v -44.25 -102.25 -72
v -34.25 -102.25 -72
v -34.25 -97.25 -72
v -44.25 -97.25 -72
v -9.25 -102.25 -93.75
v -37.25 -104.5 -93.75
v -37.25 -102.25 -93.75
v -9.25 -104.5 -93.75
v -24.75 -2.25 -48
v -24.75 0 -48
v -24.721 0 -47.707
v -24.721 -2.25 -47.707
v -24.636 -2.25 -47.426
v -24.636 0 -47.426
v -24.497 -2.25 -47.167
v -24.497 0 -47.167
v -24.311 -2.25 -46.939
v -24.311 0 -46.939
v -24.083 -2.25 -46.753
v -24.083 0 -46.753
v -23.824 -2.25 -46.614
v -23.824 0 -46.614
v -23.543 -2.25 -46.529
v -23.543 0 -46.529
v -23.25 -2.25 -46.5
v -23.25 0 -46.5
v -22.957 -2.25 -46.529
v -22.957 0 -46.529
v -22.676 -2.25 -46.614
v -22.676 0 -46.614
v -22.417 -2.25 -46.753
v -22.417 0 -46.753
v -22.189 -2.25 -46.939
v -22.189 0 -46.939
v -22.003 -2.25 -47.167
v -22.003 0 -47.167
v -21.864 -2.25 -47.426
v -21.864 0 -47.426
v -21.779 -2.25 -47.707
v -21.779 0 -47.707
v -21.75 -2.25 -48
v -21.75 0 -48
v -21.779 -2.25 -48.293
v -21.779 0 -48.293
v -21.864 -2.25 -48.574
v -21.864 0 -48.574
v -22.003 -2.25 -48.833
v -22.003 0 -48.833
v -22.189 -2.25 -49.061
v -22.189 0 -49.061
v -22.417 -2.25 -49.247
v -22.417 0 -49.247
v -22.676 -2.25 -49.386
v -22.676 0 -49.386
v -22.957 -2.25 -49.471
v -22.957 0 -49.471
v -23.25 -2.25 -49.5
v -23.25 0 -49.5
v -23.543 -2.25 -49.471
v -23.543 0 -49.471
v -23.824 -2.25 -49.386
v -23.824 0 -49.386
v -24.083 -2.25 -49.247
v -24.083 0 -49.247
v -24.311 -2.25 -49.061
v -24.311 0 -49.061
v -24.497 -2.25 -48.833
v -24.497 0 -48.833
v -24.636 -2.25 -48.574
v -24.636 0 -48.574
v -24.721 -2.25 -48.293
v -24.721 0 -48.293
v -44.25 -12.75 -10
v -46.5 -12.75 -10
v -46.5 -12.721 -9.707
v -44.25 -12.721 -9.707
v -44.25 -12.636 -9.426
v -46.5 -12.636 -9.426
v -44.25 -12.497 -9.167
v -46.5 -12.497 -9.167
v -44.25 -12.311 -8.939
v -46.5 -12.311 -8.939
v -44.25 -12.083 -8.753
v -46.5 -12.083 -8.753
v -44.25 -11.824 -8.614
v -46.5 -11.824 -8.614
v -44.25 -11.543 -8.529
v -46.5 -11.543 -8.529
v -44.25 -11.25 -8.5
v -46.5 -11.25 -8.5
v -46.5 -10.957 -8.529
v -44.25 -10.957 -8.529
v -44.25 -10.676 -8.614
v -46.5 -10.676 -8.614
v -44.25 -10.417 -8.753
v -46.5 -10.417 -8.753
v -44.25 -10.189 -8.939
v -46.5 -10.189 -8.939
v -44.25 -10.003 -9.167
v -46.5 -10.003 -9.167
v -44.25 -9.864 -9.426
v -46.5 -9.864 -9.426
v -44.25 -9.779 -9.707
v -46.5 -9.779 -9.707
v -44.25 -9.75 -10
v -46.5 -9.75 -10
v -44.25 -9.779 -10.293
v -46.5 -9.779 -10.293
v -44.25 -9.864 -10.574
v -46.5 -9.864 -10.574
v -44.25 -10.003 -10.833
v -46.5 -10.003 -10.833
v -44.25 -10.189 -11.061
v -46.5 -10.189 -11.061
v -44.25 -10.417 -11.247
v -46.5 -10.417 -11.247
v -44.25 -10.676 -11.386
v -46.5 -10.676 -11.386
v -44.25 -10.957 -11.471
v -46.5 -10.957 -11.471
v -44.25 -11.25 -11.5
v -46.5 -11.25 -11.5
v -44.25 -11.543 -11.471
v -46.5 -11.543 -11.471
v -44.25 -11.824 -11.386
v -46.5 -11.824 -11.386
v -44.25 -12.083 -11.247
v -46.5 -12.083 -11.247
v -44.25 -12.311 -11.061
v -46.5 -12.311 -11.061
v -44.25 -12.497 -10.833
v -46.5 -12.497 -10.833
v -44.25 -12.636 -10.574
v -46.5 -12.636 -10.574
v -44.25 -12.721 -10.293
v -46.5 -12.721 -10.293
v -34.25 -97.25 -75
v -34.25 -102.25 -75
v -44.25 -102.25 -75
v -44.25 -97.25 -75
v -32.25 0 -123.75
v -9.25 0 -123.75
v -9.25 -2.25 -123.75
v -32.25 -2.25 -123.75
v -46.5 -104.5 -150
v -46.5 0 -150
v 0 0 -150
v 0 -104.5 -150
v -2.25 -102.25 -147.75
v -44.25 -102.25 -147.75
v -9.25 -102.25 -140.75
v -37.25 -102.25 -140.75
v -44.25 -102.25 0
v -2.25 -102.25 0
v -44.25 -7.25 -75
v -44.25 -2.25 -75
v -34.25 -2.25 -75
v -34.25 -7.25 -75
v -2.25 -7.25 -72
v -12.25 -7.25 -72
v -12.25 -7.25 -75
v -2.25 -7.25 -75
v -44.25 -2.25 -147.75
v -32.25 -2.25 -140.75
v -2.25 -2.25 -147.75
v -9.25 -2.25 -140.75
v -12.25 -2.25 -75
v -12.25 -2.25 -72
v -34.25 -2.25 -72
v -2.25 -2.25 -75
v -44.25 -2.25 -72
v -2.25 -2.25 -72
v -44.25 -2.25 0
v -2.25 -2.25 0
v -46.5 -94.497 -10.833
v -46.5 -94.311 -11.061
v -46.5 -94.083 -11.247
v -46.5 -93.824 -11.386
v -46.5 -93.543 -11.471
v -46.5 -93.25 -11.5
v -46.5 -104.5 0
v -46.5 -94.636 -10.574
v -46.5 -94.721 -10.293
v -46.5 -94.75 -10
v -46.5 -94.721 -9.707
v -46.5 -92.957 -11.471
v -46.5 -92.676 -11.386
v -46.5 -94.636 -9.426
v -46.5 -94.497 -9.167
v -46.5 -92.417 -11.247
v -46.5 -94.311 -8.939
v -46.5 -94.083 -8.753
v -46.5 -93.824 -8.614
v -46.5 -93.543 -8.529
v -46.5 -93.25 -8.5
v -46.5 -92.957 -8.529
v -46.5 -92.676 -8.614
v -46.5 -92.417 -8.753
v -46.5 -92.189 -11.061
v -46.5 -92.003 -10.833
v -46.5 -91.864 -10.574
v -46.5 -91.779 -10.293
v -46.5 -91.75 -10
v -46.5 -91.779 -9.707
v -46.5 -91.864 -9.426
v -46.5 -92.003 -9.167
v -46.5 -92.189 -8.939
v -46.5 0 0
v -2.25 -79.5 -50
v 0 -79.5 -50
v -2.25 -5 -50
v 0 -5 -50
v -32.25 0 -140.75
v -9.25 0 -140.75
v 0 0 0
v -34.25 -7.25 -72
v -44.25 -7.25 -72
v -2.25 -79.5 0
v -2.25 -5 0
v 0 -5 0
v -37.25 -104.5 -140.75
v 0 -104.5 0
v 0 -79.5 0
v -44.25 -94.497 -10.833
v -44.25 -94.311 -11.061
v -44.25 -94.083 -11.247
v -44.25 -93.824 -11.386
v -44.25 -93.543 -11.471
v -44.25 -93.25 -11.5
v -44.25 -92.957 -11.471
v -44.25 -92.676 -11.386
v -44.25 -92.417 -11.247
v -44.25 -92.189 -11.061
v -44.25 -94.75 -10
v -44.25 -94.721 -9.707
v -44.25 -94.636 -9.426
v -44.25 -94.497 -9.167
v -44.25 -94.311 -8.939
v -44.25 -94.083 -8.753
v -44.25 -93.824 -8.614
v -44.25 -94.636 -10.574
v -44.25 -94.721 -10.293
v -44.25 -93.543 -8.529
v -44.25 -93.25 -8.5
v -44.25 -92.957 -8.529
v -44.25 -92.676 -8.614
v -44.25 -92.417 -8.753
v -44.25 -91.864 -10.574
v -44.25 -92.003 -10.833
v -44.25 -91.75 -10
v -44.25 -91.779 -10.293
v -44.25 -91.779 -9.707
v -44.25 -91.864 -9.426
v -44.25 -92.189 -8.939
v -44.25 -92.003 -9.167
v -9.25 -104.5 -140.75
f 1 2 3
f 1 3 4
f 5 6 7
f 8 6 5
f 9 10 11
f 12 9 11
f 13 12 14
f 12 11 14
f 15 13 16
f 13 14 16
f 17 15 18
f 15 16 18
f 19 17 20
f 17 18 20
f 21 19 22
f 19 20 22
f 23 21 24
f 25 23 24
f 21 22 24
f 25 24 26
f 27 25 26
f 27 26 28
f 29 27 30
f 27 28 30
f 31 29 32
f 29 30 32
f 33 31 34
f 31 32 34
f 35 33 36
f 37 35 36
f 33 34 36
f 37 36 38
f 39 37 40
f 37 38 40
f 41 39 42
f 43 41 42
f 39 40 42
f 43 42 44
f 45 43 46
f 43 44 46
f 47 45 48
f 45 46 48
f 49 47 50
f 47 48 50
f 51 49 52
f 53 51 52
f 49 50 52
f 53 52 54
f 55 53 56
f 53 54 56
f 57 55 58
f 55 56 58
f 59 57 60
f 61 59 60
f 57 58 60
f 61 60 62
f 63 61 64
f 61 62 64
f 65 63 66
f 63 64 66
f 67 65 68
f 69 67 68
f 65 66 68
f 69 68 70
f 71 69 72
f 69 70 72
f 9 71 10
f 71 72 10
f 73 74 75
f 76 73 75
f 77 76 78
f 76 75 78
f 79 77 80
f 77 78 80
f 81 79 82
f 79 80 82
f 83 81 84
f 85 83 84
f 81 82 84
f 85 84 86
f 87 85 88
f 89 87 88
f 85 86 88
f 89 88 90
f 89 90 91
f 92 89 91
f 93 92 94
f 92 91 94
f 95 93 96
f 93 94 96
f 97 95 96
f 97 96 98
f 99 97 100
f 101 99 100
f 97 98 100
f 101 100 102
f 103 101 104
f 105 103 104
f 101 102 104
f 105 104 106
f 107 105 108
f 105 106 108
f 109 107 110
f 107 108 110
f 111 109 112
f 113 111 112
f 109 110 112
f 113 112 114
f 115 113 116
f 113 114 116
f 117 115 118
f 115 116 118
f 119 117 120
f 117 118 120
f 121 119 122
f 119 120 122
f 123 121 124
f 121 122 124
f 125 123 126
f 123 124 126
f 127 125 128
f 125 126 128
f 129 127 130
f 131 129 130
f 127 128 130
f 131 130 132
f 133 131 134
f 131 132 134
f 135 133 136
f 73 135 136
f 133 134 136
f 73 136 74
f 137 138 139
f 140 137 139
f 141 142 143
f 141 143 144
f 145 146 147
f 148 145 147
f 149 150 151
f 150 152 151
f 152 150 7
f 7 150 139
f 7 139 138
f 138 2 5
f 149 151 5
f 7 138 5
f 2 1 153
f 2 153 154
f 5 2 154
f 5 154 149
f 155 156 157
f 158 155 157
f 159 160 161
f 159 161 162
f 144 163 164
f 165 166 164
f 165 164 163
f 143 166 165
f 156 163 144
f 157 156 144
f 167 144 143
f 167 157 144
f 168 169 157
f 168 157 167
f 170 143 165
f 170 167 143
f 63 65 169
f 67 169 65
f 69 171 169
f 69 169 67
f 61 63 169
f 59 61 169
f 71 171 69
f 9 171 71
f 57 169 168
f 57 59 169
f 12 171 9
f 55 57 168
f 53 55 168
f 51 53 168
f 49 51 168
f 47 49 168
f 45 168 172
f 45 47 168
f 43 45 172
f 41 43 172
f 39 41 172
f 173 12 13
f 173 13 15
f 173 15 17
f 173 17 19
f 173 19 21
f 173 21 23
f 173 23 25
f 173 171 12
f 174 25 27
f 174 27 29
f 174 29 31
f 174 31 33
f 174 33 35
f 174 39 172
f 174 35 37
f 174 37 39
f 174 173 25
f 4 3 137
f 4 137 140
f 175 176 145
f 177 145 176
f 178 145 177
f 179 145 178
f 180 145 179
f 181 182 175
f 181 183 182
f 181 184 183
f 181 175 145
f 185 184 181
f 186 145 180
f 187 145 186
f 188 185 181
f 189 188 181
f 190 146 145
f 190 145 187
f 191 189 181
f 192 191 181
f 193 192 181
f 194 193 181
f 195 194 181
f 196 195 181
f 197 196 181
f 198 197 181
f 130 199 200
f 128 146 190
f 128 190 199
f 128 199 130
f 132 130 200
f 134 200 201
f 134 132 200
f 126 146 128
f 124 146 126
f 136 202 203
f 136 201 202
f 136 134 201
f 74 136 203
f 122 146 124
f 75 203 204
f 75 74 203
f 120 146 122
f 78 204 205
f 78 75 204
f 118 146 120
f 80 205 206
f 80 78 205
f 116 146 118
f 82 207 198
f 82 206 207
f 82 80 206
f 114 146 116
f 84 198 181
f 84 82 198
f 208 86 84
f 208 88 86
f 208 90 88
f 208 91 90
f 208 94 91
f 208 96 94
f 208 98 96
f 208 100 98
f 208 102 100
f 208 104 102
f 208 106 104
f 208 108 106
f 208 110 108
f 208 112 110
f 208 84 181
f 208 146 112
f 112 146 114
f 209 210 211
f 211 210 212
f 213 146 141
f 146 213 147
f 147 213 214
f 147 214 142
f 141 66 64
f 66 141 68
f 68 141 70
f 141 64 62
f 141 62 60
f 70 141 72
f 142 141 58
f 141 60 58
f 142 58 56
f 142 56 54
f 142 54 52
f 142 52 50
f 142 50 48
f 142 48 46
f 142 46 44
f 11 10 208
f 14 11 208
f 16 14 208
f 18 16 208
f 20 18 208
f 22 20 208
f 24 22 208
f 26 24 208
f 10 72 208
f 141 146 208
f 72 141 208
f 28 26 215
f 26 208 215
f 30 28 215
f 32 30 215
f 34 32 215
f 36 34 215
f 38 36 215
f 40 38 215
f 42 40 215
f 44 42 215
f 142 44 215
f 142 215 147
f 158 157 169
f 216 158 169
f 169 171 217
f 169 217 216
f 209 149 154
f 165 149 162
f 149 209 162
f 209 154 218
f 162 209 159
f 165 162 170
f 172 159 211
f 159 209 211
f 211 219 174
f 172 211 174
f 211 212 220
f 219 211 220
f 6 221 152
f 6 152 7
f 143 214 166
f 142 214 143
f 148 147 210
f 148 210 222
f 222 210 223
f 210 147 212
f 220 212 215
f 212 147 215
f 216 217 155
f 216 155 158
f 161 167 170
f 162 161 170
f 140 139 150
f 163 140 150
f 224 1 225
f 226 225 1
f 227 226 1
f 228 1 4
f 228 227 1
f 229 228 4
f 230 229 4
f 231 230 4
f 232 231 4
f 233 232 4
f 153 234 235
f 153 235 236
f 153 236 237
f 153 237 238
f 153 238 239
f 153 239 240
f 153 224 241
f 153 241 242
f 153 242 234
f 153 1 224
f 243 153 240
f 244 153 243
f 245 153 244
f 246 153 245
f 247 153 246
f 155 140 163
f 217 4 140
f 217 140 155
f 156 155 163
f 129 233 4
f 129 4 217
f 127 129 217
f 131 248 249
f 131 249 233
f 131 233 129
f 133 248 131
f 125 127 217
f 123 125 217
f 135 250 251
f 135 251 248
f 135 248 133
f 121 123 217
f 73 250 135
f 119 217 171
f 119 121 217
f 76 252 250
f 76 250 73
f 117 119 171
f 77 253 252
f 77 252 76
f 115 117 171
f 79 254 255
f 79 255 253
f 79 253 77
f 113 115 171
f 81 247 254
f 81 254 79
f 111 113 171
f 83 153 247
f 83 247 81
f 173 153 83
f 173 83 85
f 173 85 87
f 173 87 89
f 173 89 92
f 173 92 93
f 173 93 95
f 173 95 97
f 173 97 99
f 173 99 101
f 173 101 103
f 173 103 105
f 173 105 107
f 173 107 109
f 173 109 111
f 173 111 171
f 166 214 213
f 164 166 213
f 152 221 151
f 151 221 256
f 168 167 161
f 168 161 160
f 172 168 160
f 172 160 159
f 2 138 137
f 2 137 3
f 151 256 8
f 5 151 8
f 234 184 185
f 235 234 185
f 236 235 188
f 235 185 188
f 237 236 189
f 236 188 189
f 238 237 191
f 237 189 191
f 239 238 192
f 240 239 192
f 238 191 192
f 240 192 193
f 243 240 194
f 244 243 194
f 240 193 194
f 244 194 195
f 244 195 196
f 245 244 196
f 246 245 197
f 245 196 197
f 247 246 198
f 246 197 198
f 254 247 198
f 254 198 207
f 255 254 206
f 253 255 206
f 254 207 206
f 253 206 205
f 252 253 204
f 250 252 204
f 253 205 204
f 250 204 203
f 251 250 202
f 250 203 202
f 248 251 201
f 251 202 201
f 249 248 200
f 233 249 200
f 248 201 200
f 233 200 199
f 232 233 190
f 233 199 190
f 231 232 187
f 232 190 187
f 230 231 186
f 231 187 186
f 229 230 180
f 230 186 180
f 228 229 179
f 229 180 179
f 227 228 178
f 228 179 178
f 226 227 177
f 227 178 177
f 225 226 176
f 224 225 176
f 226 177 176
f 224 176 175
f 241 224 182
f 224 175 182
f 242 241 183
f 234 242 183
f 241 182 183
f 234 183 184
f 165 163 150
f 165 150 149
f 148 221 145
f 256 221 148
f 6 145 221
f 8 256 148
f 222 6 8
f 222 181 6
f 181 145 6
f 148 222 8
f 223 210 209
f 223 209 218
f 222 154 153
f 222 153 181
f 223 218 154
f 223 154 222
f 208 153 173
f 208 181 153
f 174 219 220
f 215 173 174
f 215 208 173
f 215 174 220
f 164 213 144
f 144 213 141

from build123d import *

# Parameters (mm, degrees)
F0_W      = 46.5
F0_H      = 150
F1_DEPTH  = 104.5
F2_W      = 42
F2_H      = 100
F3_DEPTH  = 147.75
F4_W      = 74.5
F4_H      = 50
F5_DEPTH  = 2.25
F6_R      = 1.5
F7_DEPTH  = 2.25
F8_R      = 1.5
F9_DEPTH  = 2.25
F10_W     = 10
F10_H     = 3
F11_DEPTH = 5
F12_W     = 10
F12_H     = 3
F13_DEPTH = 5
F14_W     = 28
F14_H     = 47
F15_DEPTH = 2.25
F16_W     = 23
F16_H     = 17
F17_DEPTH = 2.25


with BuildPart() as f1:
    # F0 (on Front) → F1 (new body)
    with BuildSketch(Plane.XZ):
        with Locations((-23.25, -75)):
            Rectangle(F0_W, F0_H)
    extrude(amount=F1_DEPTH)

    # F2 (on face) → F3 (cut, through all)
    with BuildSketch(Plane.XY):
        with Locations((-23.25, -52.25)):
            Rectangle(F2_W, F2_H)
    extrude(amount=-F3_DEPTH, mode=Mode.SUBTRACT)

    # F4 (on face) → F5 (cut)
    with BuildSketch(Plane.YZ):
        with Locations((-42.25, -25)):
            Rectangle(F4_W, F4_H)
    extrude(amount=-F5_DEPTH, mode=Mode.SUBTRACT)

    # F6 (on face) → F7 (cut)
    with BuildSketch(Plane(origin=(-46.5, 0, 0), x_dir=(0, -1, 0), z_dir=(-1, 0, 0))):
        with Locations((11.25, -10)):
            Circle(F6_R)
        with Locations((93.25, -10)):
            Circle(F6_R)
    extrude(amount=-F7_DEPTH, mode=Mode.SUBTRACT)

    # F8 (on face) → F9 (cut)
    with BuildSketch(Plane(origin=(0, 0, 0), x_dir=(-1, 0, 0), z_dir=(0, 1, 0))):
        with Locations((23.25, -48)):
            Circle(F8_R)
    extrude(amount=-F9_DEPTH, mode=Mode.SUBTRACT)

    # F10 (on face) → F11 (join)
    with BuildSketch(Plane.XZ.offset(2.25)):
        with Locations((-39.25, -73.5)):
            Rectangle(F10_W, F10_H)
        with Locations((-7.25, -73.5)):
            Rectangle(F10_W, F10_H)
    extrude(amount=F11_DEPTH)

    # F12 (on face) → F13 (join)
    with BuildSketch(Plane(origin=(0, -102.25, 0), x_dir=(-1, 0, 0), z_dir=(0, 1, 0))):
        with Locations((39.25, -73.5)):
            Rectangle(F12_W, F12_H)
    extrude(amount=F13_DEPTH)

    # F14 (on face) → F15 (cut)
    with BuildSketch(Plane.XZ.offset(104.5)):
        with Locations((-23.25, -117.25)):
            Rectangle(F14_W, F14_H)
    extrude(amount=-F15_DEPTH, mode=Mode.SUBTRACT)

    # F16 (on face) → F17 (cut)
    with BuildSketch(Plane(origin=(0, 0, 0), x_dir=(-1, 0, 0), z_dir=(0, 1, 0))):
        with Locations((20.75, -132.25)):
            Rectangle(F16_W, F16_H)
    extrude(amount=-F17_DEPTH, mode=Mode.SUBTRACT)


solid = f1.part
